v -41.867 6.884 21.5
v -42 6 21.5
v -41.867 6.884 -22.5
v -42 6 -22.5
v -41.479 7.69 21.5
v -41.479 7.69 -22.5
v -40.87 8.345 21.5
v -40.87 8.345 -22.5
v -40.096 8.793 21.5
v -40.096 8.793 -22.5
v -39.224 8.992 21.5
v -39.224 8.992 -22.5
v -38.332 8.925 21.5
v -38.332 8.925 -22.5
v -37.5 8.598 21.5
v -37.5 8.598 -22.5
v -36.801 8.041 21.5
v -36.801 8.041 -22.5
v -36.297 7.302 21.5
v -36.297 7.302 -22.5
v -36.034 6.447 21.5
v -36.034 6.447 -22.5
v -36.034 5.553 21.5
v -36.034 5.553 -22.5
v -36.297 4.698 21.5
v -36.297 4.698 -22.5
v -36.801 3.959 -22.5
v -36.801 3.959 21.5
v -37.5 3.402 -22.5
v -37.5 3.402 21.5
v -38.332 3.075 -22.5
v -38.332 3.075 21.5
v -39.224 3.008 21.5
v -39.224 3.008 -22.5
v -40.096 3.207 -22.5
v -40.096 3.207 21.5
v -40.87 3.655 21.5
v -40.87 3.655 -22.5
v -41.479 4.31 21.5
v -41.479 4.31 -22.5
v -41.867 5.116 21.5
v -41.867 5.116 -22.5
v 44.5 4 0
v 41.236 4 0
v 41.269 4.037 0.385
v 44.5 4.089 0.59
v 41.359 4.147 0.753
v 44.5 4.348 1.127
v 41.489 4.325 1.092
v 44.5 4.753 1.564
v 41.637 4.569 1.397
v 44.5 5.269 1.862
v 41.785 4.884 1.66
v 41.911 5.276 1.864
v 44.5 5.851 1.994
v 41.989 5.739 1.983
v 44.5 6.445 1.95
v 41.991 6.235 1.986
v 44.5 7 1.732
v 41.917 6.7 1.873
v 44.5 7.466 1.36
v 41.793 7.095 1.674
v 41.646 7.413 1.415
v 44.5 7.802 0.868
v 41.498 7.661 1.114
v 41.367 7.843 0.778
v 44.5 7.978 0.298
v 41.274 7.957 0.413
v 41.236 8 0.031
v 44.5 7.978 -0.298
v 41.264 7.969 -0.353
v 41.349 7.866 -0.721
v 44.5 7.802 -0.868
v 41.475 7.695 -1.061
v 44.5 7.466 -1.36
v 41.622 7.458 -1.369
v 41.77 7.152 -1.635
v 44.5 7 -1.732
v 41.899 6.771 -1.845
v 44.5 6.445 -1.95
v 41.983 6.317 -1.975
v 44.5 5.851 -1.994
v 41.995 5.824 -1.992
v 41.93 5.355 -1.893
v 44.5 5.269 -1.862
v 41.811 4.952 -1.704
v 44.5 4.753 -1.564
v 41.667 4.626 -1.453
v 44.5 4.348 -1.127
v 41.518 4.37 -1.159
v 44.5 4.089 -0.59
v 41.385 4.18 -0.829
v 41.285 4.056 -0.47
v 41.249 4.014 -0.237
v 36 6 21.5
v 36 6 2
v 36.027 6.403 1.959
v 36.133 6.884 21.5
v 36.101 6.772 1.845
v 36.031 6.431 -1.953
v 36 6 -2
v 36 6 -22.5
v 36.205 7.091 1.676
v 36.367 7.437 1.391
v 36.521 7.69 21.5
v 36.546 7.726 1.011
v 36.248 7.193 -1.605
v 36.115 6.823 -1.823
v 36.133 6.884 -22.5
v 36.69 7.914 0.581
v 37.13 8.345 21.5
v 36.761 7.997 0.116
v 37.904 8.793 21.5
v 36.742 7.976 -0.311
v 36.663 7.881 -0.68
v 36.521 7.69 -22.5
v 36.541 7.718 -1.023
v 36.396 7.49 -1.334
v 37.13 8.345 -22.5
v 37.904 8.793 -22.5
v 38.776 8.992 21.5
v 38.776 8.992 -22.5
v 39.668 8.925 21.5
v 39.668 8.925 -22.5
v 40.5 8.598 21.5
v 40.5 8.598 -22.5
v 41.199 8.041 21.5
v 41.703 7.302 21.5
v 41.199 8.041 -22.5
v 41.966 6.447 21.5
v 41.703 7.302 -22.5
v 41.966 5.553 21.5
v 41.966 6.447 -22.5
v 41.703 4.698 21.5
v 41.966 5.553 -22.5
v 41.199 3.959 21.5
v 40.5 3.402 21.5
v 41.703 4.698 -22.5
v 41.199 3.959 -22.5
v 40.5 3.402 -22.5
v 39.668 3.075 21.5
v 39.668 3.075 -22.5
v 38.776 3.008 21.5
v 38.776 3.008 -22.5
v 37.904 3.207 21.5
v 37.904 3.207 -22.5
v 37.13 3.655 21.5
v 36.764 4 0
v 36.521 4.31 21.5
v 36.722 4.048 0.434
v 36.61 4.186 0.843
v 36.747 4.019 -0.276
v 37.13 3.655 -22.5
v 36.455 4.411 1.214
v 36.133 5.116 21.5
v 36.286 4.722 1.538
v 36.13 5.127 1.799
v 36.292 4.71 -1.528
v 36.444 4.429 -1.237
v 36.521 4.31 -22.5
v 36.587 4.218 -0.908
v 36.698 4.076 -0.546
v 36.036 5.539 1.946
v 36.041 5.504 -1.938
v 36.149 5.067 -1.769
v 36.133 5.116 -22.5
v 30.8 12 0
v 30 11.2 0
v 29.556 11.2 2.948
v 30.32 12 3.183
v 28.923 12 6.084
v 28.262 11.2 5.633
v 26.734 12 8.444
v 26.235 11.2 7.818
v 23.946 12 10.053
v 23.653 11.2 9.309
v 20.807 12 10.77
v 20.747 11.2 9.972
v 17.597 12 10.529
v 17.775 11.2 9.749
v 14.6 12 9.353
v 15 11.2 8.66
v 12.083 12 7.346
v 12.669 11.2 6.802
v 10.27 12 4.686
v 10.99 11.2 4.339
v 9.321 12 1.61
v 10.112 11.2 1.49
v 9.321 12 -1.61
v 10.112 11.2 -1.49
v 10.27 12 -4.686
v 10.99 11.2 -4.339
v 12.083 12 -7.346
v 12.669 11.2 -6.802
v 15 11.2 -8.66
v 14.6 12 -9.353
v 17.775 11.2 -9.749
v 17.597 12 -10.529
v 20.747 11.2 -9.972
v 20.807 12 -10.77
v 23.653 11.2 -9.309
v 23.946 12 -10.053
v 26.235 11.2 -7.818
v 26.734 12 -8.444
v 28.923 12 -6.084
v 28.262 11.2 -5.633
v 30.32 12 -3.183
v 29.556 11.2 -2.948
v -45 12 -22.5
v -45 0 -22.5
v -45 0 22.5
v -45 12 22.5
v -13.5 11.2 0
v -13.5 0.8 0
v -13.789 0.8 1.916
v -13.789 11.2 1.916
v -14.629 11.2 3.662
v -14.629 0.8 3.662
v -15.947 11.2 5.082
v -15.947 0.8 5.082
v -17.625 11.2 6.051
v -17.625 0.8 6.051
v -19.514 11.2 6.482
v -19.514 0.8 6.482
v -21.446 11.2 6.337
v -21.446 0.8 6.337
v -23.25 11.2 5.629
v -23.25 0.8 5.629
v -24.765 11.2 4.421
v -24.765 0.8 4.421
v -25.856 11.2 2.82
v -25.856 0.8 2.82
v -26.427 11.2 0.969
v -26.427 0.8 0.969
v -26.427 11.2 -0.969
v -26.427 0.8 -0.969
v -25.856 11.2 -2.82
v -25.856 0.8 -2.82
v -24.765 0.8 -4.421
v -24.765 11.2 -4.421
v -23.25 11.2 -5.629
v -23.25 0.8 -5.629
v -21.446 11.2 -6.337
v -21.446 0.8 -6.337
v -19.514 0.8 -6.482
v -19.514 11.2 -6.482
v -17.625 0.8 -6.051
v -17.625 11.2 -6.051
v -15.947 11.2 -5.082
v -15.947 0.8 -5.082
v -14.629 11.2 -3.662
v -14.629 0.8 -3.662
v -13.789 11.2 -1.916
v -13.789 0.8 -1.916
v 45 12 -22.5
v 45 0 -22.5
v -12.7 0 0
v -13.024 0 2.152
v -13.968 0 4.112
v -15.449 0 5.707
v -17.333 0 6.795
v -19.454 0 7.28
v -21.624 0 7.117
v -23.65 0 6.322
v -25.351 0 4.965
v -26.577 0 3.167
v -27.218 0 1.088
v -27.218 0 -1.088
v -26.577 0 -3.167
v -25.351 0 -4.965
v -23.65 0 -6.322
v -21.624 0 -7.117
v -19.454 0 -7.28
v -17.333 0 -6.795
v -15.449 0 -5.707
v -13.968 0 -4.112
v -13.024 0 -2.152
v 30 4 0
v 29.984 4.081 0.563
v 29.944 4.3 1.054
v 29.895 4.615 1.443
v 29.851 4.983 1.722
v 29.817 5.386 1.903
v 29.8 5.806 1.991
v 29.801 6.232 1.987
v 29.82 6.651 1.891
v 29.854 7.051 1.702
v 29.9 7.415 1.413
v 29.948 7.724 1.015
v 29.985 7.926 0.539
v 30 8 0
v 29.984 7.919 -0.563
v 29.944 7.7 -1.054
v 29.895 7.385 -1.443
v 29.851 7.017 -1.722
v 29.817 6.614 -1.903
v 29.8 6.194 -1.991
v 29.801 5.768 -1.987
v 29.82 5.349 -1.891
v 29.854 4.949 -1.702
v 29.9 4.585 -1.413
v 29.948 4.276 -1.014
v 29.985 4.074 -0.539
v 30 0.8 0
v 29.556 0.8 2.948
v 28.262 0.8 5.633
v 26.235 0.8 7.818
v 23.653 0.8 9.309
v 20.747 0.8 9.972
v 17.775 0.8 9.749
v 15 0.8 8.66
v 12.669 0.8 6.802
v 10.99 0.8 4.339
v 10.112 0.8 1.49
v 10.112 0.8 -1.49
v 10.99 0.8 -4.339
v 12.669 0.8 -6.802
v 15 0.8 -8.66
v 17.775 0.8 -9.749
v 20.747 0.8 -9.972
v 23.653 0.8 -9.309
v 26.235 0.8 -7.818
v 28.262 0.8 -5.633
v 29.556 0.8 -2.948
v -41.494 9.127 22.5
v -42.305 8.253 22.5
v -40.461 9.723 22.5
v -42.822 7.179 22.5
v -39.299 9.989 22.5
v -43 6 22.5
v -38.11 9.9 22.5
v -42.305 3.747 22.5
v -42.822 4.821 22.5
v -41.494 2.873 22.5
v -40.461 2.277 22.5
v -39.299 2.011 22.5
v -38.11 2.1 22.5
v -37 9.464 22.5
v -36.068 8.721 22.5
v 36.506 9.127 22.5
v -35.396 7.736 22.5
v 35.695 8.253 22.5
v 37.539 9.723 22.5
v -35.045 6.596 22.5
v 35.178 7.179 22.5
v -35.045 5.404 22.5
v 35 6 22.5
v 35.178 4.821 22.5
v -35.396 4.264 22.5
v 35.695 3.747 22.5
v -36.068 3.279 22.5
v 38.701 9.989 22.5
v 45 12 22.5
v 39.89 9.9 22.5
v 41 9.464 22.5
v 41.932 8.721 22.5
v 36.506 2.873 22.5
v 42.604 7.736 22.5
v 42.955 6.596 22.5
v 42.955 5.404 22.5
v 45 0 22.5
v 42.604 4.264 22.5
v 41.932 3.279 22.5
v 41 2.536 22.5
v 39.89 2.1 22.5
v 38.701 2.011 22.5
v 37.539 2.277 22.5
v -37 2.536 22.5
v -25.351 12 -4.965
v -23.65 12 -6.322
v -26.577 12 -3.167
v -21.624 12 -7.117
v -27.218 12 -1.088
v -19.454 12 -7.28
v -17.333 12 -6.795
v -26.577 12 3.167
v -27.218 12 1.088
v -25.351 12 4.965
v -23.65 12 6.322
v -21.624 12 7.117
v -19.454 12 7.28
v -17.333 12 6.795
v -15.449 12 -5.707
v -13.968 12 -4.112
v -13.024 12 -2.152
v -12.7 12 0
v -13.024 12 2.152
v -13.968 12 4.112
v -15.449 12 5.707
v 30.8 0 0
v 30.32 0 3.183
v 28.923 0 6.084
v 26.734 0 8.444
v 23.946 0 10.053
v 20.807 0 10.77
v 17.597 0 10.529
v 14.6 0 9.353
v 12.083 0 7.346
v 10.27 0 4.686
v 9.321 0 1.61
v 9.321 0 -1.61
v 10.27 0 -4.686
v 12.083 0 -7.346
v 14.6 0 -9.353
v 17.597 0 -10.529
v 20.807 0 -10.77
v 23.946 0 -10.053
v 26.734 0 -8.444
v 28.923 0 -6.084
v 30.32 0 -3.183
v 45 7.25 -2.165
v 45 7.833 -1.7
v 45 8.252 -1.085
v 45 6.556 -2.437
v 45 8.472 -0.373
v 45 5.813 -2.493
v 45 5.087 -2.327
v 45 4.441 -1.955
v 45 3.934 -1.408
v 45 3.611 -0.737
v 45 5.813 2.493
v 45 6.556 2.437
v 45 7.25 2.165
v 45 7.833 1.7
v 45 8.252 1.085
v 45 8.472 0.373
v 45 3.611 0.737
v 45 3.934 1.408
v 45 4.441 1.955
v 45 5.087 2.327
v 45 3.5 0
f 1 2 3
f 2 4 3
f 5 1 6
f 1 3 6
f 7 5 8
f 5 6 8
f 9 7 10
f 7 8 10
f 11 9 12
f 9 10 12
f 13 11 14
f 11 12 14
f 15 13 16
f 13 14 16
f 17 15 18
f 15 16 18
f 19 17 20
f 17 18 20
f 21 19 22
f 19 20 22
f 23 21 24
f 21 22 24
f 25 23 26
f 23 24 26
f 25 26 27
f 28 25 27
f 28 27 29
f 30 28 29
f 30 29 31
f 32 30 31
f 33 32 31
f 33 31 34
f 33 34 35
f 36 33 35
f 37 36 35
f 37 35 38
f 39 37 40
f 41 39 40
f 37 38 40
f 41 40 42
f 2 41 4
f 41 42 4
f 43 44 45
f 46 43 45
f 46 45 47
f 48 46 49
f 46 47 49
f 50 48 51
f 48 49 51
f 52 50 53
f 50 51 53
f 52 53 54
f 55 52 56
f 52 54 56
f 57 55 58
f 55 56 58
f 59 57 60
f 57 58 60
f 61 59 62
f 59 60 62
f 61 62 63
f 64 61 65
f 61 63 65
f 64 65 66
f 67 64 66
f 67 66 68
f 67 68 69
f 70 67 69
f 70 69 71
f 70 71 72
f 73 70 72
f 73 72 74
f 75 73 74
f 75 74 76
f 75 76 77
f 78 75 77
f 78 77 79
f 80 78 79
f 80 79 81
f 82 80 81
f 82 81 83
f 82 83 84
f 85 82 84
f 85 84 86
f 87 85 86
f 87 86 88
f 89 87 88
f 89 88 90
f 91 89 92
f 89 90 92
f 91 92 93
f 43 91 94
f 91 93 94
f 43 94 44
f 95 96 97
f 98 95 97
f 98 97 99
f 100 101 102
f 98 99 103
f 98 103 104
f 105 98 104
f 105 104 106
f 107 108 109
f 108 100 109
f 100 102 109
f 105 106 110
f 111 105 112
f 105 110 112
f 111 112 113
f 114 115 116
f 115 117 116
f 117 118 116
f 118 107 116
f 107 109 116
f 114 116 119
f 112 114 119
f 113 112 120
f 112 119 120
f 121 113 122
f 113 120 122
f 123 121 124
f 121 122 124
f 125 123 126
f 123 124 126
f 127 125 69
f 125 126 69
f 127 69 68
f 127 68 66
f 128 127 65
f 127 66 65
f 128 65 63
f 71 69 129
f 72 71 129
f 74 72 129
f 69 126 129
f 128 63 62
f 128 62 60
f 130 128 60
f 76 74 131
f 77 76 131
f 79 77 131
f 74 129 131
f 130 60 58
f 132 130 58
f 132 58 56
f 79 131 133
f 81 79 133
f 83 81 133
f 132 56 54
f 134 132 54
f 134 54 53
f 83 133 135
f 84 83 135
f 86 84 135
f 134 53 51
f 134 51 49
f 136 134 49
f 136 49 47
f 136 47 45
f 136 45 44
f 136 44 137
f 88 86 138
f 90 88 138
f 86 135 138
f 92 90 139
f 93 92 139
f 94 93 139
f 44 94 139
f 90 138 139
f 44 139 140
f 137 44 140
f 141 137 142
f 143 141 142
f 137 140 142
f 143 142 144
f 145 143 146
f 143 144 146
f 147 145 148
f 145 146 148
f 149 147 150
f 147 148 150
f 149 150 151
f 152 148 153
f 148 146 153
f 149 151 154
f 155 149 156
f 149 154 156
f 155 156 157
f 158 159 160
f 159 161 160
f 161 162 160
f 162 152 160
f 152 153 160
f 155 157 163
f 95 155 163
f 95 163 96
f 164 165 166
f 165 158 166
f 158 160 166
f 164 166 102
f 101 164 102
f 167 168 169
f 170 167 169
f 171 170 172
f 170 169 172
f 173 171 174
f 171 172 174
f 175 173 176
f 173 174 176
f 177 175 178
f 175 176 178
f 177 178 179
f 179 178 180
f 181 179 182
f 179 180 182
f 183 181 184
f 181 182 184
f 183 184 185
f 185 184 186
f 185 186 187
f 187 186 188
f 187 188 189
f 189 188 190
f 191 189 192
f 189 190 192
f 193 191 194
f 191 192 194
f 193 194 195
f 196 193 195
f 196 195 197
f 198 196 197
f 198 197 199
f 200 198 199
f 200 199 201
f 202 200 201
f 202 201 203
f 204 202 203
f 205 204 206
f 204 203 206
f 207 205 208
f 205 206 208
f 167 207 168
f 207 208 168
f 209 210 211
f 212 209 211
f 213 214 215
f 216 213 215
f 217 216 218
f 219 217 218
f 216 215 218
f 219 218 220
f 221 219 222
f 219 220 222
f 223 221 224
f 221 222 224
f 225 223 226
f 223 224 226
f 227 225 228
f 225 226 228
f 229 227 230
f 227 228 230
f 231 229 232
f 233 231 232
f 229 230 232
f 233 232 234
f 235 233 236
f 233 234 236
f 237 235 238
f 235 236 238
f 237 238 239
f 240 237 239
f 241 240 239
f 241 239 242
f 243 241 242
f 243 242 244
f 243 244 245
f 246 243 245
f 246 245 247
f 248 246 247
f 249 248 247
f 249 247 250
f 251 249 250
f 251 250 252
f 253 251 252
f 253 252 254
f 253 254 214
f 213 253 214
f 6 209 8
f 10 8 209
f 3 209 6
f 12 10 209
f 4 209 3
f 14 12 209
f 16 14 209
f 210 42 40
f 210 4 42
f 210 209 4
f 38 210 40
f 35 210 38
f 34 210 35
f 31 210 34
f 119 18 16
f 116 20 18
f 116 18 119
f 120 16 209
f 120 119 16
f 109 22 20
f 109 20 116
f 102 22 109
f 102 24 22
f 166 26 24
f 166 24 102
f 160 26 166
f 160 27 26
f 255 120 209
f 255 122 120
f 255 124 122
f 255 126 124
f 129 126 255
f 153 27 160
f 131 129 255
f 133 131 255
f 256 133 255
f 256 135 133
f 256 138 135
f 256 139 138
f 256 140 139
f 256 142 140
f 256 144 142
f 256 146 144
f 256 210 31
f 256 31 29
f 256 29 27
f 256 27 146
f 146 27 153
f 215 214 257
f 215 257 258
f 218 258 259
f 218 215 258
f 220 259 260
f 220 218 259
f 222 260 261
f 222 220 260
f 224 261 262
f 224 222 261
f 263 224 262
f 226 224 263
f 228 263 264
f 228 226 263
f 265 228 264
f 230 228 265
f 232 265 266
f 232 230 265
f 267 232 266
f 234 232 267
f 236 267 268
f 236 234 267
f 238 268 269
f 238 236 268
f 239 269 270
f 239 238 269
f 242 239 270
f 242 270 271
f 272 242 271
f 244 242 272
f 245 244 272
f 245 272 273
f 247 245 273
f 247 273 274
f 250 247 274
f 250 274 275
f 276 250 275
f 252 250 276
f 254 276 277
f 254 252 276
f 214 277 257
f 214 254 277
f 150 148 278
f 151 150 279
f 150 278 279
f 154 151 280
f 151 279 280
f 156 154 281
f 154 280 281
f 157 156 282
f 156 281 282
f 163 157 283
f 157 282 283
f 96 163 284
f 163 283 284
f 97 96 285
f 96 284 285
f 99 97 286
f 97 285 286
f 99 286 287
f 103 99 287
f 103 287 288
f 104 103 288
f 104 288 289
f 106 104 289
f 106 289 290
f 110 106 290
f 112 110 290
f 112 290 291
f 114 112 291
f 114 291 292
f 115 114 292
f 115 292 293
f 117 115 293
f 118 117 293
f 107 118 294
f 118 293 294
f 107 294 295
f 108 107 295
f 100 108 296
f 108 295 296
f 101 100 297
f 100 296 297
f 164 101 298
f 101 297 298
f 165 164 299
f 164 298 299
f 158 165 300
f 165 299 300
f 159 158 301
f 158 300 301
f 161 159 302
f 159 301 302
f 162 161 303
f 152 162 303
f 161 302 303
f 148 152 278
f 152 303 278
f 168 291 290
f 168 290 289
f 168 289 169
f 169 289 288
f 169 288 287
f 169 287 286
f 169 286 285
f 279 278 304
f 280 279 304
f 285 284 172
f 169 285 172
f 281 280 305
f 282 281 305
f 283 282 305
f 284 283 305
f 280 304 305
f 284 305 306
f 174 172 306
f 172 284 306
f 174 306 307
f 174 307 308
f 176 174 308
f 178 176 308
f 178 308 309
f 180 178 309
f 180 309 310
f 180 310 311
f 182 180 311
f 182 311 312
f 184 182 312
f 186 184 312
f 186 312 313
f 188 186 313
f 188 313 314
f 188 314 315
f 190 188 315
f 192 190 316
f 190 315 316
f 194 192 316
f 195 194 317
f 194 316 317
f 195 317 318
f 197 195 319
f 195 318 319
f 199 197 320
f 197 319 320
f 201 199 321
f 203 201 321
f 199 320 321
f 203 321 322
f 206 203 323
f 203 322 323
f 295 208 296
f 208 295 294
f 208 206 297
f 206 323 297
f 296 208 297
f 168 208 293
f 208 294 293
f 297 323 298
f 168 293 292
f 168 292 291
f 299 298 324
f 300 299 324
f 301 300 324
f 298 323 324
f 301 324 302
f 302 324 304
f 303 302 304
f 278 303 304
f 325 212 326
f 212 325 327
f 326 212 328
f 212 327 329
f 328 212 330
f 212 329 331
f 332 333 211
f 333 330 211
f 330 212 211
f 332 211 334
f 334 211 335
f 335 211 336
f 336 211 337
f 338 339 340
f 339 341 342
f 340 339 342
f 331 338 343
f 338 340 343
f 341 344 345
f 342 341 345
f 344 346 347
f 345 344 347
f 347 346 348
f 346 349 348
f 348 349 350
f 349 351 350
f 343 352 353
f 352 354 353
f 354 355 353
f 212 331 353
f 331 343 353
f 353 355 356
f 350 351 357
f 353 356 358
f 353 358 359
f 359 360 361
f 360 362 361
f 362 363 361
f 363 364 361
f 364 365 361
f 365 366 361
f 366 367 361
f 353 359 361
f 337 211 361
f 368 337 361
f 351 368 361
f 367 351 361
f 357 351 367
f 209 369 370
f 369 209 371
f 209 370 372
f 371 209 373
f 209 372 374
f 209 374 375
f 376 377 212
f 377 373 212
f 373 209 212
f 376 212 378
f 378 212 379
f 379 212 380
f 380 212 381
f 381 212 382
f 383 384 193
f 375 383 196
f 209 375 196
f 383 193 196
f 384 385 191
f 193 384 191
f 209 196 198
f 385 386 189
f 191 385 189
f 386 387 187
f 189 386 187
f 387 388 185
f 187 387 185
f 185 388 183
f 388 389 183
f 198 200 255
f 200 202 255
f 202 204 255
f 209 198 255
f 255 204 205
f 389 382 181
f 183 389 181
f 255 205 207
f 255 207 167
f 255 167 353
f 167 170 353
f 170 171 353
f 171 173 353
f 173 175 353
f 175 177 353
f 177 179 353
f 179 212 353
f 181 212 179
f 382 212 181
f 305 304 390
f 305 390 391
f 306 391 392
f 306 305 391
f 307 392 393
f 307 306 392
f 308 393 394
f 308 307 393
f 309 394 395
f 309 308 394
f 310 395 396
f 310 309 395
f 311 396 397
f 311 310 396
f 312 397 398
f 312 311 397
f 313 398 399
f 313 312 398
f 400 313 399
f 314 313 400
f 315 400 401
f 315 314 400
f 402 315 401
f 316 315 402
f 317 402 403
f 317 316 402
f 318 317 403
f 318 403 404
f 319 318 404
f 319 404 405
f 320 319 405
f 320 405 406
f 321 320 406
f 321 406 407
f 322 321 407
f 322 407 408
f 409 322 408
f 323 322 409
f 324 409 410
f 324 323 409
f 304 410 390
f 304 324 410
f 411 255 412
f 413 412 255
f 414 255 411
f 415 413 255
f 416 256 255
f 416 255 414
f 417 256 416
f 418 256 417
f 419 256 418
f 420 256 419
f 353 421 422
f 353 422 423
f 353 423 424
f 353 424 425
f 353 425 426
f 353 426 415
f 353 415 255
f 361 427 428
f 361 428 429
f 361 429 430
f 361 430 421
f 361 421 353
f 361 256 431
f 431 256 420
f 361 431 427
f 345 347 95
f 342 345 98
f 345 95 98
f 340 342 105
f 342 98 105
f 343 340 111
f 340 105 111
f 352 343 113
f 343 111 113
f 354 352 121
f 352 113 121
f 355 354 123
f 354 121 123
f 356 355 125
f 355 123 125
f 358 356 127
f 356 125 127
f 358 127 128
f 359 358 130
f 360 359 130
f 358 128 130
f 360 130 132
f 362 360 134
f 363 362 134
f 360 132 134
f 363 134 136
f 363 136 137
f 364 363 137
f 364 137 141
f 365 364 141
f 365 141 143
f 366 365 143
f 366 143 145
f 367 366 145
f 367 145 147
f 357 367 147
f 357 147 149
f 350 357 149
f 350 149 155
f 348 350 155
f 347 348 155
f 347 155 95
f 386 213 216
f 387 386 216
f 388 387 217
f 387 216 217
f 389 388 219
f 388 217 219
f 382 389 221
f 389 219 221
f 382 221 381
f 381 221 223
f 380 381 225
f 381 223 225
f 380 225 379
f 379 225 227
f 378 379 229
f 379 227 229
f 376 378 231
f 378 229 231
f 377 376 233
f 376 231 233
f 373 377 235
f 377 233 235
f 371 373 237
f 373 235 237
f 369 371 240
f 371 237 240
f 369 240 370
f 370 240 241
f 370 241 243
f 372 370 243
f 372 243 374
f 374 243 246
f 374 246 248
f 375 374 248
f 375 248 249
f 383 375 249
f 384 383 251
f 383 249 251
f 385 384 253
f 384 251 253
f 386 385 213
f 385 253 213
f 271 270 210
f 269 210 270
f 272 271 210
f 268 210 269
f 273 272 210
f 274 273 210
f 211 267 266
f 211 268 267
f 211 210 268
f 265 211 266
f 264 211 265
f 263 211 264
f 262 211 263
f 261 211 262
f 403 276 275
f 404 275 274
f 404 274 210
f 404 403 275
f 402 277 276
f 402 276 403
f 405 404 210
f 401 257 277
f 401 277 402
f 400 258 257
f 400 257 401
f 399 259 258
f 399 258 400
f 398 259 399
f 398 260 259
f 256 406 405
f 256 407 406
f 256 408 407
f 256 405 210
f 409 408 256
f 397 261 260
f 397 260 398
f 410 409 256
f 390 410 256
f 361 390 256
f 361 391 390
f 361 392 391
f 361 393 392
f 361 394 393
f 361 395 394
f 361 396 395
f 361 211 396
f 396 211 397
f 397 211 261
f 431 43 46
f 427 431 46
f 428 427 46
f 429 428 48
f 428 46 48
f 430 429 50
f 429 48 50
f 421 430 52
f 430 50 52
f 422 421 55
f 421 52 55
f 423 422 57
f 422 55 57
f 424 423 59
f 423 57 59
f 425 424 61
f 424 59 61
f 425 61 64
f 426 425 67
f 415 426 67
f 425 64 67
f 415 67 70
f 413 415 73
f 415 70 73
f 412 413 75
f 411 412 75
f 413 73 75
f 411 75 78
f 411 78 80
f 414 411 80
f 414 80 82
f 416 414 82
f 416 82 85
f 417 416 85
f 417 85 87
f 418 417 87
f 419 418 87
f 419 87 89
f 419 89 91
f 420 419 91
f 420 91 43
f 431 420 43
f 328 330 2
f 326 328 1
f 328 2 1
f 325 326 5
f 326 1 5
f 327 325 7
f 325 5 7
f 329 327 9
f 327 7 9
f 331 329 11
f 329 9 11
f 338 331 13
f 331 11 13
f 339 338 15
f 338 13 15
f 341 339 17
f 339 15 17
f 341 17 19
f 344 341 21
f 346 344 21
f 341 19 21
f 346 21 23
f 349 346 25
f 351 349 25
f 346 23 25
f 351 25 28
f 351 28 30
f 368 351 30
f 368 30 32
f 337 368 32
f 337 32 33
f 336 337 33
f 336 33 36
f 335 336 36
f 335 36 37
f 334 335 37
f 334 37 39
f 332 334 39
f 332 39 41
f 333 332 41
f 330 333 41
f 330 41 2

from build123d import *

# Parameters (mm, degrees)
F0_W           = 90
F0_H           = 45
F1_DEPTH       = 12
F2_R           = 6.5
F2_R_2         = 10
F3_DEPTH       = 25
F4_SIZE        = 0.8
F7_D           = 6
F7_CSINK_D     = 8
F7_CSINK_ANGLE = 90
F9_D           = 4
F9_DEPTH       = 30
F9_CSINK_D     = 5
F9_CSINK_ANGLE = 90
F9_TIP         = 1.2017212381


with BuildPart() as f1:
    # F0 (on Front) → F1 (new body)
    with BuildSketch(Plane.XZ):
        Rectangle(F0_W, F0_H)
    extrude(amount=-F1_DEPTH)

    # F2 (on Front) → F3 (cut)
    with BuildSketch(Plane.XZ):
        with Locations((-20, 0)):
            Circle(F2_R)
        with Locations((20, 0)):
            Circle(F2_R_2)
    extrude(amount=-F3_DEPTH, mode=Mode.SUBTRACT)

    # F4
    f4_edges = [f1.edges().sort_by_distance(p)[0] for p in [
        (-26.5, 0, 0),
        (-26.5, 12, 0),
        (10, 0, 0),
        (10, 12, 0),
    ]]
    chamfer(f4_edges, length=F4_SIZE)

    # F7 (through all)
    with Locations(Plane.XY.offset(22.5)):
        with Locations((-39, 6), (39, 6)):
            CounterSinkHole(F7_D / 2, F7_CSINK_D / 2, counter_sink_angle=F7_CSINK_ANGLE)

    # F9
    with Locations(Plane.YZ.offset(45)):
        with Locations((6, 0)):
            CounterSinkHole(F9_D / 2, F9_CSINK_D / 2, depth=F9_DEPTH, counter_sink_angle=F9_CSINK_ANGLE)
            with Locations((0, 0, -(F9_DEPTH + F9_TIP / 2))):  # 118° drill point
                Cone(0, F9_D / 2, F9_TIP, mode=Mode.SUBTRACT)


solid = f1.part
